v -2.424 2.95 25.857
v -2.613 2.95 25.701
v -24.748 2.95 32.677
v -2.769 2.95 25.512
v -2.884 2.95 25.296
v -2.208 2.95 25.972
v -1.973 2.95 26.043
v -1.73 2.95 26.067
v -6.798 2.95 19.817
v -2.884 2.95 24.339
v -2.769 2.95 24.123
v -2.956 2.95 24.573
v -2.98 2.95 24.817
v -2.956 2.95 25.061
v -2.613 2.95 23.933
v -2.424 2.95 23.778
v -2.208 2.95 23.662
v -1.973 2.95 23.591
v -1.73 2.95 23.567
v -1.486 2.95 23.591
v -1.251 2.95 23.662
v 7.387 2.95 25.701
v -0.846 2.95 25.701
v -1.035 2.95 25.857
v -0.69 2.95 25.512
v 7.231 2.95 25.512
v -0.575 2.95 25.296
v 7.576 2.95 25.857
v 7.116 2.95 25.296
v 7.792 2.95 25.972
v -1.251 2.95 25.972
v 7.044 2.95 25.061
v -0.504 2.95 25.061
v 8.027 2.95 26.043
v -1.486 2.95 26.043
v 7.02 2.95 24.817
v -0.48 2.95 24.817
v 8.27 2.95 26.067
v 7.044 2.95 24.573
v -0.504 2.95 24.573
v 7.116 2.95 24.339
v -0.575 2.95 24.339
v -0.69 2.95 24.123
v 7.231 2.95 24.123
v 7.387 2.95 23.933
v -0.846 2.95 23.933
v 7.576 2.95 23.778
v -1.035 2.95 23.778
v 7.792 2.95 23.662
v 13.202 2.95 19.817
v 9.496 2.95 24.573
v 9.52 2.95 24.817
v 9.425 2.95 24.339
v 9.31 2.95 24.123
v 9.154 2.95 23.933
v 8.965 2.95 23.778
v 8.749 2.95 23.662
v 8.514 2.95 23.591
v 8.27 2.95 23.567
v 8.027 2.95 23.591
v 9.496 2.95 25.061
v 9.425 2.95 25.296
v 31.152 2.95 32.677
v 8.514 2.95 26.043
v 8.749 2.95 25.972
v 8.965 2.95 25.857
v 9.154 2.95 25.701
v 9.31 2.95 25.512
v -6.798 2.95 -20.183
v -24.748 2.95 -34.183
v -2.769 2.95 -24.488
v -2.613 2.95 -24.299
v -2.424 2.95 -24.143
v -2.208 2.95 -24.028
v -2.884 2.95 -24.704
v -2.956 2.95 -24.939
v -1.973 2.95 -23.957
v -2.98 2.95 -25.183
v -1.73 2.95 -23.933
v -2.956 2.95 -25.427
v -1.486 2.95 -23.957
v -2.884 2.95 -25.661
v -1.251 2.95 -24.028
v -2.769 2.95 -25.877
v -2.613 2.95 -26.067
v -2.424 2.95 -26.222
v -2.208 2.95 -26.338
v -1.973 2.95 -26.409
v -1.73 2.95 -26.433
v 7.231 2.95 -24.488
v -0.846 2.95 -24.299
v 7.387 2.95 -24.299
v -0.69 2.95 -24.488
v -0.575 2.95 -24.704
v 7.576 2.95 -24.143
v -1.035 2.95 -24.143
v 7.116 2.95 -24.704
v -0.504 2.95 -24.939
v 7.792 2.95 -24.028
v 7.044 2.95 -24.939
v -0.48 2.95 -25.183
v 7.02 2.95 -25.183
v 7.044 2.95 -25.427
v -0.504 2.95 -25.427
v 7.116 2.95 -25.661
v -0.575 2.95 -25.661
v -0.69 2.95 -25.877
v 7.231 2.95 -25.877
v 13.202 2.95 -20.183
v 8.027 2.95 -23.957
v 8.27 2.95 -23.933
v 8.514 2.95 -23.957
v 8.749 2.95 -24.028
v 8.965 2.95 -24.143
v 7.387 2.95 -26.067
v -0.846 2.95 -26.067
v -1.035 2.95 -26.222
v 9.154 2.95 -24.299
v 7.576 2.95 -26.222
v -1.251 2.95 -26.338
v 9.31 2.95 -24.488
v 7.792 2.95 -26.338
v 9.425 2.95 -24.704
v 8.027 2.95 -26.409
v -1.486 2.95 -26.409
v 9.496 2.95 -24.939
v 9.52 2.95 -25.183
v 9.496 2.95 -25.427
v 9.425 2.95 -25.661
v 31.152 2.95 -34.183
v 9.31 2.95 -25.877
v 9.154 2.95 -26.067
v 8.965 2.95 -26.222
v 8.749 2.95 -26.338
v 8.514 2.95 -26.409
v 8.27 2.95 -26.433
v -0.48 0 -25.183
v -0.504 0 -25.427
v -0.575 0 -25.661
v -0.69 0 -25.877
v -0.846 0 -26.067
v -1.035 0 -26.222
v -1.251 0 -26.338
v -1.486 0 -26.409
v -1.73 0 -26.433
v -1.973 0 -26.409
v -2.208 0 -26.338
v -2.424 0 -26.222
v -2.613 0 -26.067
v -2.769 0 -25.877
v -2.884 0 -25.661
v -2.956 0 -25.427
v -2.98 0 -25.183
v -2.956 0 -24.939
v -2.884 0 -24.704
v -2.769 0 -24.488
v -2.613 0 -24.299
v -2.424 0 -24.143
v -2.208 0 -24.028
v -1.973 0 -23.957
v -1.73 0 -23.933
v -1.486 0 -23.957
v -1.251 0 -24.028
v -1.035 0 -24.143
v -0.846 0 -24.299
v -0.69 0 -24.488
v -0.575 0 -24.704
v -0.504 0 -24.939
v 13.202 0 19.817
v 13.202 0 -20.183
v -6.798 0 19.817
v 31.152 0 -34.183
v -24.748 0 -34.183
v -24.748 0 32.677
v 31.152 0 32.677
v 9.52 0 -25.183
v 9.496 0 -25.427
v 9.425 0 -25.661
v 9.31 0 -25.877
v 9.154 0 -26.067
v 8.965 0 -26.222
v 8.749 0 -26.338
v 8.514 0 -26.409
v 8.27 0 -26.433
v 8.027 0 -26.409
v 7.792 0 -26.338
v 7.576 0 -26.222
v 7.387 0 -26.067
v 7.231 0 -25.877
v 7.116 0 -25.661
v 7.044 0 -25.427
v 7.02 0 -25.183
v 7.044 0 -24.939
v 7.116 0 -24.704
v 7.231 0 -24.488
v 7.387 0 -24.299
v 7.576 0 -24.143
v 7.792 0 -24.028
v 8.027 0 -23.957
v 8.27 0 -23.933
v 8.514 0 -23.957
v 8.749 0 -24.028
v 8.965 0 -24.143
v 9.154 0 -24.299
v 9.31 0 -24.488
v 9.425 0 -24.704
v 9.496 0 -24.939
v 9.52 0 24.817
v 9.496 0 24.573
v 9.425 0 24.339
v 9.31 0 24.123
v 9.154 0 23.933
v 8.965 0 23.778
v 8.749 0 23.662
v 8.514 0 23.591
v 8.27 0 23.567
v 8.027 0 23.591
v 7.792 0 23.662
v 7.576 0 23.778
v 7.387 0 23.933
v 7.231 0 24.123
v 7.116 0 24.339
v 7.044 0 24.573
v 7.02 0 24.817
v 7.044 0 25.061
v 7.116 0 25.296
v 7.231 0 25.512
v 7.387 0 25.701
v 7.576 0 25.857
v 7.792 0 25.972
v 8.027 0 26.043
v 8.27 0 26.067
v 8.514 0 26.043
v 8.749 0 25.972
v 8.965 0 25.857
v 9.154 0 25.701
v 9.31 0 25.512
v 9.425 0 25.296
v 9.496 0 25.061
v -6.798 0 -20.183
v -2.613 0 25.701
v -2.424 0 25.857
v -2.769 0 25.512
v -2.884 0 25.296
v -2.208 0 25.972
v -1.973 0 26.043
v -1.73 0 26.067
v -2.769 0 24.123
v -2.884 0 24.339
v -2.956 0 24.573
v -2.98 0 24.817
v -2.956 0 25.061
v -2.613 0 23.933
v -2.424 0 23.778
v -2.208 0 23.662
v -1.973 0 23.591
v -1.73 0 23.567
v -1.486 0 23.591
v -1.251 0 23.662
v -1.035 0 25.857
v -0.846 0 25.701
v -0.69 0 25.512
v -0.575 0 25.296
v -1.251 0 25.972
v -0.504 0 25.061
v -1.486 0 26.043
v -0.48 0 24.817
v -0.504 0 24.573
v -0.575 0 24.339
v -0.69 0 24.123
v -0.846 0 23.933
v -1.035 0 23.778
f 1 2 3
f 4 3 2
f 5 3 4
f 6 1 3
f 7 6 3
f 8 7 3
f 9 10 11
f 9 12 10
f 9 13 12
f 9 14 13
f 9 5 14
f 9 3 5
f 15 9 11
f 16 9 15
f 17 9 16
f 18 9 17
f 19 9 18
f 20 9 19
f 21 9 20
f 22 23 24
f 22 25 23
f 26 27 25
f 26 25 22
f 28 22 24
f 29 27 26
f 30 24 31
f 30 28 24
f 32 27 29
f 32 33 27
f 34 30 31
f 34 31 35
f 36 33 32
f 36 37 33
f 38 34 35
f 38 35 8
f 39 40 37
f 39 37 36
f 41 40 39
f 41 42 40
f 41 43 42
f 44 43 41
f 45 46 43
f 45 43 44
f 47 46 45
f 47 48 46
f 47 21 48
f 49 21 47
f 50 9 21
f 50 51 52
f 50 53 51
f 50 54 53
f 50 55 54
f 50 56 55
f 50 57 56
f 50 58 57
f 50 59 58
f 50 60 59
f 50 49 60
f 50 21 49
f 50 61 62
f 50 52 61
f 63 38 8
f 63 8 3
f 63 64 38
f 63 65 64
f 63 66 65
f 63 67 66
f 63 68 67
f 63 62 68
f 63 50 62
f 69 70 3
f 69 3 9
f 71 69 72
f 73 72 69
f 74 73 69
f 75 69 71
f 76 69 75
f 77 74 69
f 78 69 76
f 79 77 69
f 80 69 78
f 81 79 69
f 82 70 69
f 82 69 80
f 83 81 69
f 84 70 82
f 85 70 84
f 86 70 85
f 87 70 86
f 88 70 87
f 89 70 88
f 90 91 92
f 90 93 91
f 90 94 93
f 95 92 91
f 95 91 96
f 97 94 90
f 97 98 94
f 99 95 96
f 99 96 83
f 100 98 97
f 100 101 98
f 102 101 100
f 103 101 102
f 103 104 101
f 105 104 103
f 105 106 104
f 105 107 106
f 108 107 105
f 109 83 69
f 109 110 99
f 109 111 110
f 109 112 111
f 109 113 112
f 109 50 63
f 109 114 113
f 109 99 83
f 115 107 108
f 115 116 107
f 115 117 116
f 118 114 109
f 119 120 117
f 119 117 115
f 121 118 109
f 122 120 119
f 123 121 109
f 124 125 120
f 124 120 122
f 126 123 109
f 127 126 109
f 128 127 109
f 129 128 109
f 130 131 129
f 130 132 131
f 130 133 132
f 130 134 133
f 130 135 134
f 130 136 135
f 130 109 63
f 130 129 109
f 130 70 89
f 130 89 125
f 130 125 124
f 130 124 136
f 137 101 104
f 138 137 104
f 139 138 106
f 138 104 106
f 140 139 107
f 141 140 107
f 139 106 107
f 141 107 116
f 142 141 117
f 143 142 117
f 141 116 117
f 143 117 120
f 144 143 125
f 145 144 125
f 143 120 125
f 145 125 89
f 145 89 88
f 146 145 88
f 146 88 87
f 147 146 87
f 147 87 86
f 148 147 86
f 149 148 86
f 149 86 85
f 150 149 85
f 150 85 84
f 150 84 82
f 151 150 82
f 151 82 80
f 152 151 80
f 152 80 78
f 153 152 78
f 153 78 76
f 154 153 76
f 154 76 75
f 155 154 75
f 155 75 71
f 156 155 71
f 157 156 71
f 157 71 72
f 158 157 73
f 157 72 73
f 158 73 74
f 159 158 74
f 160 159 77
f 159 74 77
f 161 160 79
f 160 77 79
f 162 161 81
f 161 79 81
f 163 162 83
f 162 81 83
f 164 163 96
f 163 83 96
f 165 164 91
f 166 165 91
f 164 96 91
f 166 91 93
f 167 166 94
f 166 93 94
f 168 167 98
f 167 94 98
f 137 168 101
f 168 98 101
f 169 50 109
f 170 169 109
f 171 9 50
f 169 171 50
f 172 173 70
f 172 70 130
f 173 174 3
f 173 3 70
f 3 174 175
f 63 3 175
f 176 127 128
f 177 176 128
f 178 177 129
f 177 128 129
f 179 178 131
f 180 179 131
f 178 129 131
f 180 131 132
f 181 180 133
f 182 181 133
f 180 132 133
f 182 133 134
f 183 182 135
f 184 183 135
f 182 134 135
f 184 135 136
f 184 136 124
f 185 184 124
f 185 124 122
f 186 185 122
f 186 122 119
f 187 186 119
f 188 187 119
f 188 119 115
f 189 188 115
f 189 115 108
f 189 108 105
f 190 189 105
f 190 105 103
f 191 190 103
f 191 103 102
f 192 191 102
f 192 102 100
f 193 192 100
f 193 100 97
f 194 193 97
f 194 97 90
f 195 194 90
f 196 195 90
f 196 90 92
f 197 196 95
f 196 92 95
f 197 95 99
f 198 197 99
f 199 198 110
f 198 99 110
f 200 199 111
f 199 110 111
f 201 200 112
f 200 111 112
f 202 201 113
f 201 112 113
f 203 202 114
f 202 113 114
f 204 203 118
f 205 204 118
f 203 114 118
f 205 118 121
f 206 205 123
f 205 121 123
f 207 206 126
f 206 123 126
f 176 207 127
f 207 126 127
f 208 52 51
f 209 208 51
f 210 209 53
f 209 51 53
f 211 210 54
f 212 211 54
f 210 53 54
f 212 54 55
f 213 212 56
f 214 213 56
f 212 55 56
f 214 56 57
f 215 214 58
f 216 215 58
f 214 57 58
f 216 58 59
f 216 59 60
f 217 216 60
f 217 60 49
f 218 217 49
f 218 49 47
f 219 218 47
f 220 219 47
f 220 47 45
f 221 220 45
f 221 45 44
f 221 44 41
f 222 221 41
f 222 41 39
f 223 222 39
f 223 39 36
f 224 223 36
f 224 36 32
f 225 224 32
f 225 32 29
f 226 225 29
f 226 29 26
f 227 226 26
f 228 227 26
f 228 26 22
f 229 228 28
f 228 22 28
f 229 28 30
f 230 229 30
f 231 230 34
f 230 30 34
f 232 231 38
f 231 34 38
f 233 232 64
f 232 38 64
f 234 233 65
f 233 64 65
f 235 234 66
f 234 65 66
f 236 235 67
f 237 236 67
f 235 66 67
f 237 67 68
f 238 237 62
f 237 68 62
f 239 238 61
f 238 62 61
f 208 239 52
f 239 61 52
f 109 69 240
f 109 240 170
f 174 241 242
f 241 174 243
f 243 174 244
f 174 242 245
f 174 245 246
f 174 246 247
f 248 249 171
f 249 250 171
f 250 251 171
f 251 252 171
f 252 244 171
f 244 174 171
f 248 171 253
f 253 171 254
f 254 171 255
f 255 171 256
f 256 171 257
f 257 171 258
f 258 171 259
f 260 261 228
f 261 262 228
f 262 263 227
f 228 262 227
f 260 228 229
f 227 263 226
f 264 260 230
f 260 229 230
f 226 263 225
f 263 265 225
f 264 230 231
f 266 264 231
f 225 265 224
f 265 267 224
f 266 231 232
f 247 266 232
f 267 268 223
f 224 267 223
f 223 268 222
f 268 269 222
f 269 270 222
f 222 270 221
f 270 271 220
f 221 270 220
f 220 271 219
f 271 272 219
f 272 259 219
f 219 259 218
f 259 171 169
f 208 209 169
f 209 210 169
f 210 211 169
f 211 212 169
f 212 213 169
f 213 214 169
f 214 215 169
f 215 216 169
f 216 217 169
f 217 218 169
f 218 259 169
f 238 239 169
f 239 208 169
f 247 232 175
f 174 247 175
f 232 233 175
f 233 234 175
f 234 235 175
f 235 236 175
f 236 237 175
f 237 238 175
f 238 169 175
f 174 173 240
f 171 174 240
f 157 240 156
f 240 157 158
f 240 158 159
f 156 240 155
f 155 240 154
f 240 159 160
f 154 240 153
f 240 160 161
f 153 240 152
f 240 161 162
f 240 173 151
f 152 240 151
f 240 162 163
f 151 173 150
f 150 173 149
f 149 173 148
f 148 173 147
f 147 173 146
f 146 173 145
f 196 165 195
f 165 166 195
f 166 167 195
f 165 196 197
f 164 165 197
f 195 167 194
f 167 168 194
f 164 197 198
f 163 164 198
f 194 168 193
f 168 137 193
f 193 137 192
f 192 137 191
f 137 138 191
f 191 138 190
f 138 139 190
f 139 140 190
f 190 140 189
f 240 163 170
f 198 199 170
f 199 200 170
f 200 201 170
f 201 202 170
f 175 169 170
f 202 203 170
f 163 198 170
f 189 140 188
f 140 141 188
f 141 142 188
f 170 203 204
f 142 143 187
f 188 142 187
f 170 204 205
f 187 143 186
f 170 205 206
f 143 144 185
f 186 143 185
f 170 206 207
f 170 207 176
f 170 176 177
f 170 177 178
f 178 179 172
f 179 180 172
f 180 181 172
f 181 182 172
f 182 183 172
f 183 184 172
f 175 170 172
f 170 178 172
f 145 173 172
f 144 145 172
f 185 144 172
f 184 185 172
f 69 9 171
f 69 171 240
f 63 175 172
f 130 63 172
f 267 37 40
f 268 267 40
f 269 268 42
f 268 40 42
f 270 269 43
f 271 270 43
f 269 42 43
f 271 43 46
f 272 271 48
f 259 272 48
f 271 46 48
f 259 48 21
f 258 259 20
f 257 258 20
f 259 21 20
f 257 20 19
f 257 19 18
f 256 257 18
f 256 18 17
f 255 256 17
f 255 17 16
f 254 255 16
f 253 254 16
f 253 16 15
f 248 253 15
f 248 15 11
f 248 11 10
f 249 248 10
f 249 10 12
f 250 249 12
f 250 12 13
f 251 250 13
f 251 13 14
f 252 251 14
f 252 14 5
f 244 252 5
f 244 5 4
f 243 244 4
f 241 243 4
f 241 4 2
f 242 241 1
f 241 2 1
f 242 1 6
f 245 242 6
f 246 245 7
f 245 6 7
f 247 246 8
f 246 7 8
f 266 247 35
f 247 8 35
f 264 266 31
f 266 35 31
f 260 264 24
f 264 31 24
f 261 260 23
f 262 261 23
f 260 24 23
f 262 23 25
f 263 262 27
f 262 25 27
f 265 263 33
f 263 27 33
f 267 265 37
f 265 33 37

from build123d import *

# Parameters (mm, degrees)
SKETCH1_W           = 55.9
SKETCH1_H           = 66.86
BOSS_EXTRUDE1_DEPTH = 2.95
SKETCH3_W           = 20
SKETCH3_H           = 40
CUT_EXTRUDE1_DEPTH  = 6.86
SKETCH4_R           = 1.25
CUT_EXTRUDE2_DEPTH  = 6.86


with BuildPart() as part:
    # Sketch1 → Boss-Extrude1 (new body)
    with BuildSketch(Plane(origin=(0, 0, 0), x_dir=(1, 0, 0), z_dir=(0, 1, 0))):
        with Locations((3.202267267, 0.752730799)):
            Rectangle(SKETCH1_W, SKETCH1_H)
    extrude(amount=BOSS_EXTRUDE1_DEPTH)

    # Sketch3 → Cut-Extrude1 (cut)
    with BuildSketch(Plane(origin=(0, 2.95, 0), x_dir=(1, 0, 0), z_dir=(0, 1, 0))):
        with Locations((3.202267267, 0.182730799)):
            Rectangle(SKETCH3_W, SKETCH3_H)
    extrude(amount=-CUT_EXTRUDE1_DEPTH, mode=Mode.SUBTRACT)

    # Sketch4 → Cut-Extrude2 (cut)
    with BuildSketch(Plane(origin=(0, 2.95, 0), x_dir=(1, 0, 0), z_dir=(0, 1, 0))):
        with Locations((-1.729576987, 25.182730799)):
            Circle(SKETCH4_R)
        with Locations((8.270423013, 25.182730799)):
            Circle(SKETCH4_R)
        with Locations((-1.729576987, -24.817269201)):
            Circle(SKETCH4_R)
        with Locations((8.270423013, -24.817269201)):
            Circle(SKETCH4_R)
    extrude(amount=-CUT_EXTRUDE2_DEPTH, mode=Mode.SUBTRACT)


solid = part.part
